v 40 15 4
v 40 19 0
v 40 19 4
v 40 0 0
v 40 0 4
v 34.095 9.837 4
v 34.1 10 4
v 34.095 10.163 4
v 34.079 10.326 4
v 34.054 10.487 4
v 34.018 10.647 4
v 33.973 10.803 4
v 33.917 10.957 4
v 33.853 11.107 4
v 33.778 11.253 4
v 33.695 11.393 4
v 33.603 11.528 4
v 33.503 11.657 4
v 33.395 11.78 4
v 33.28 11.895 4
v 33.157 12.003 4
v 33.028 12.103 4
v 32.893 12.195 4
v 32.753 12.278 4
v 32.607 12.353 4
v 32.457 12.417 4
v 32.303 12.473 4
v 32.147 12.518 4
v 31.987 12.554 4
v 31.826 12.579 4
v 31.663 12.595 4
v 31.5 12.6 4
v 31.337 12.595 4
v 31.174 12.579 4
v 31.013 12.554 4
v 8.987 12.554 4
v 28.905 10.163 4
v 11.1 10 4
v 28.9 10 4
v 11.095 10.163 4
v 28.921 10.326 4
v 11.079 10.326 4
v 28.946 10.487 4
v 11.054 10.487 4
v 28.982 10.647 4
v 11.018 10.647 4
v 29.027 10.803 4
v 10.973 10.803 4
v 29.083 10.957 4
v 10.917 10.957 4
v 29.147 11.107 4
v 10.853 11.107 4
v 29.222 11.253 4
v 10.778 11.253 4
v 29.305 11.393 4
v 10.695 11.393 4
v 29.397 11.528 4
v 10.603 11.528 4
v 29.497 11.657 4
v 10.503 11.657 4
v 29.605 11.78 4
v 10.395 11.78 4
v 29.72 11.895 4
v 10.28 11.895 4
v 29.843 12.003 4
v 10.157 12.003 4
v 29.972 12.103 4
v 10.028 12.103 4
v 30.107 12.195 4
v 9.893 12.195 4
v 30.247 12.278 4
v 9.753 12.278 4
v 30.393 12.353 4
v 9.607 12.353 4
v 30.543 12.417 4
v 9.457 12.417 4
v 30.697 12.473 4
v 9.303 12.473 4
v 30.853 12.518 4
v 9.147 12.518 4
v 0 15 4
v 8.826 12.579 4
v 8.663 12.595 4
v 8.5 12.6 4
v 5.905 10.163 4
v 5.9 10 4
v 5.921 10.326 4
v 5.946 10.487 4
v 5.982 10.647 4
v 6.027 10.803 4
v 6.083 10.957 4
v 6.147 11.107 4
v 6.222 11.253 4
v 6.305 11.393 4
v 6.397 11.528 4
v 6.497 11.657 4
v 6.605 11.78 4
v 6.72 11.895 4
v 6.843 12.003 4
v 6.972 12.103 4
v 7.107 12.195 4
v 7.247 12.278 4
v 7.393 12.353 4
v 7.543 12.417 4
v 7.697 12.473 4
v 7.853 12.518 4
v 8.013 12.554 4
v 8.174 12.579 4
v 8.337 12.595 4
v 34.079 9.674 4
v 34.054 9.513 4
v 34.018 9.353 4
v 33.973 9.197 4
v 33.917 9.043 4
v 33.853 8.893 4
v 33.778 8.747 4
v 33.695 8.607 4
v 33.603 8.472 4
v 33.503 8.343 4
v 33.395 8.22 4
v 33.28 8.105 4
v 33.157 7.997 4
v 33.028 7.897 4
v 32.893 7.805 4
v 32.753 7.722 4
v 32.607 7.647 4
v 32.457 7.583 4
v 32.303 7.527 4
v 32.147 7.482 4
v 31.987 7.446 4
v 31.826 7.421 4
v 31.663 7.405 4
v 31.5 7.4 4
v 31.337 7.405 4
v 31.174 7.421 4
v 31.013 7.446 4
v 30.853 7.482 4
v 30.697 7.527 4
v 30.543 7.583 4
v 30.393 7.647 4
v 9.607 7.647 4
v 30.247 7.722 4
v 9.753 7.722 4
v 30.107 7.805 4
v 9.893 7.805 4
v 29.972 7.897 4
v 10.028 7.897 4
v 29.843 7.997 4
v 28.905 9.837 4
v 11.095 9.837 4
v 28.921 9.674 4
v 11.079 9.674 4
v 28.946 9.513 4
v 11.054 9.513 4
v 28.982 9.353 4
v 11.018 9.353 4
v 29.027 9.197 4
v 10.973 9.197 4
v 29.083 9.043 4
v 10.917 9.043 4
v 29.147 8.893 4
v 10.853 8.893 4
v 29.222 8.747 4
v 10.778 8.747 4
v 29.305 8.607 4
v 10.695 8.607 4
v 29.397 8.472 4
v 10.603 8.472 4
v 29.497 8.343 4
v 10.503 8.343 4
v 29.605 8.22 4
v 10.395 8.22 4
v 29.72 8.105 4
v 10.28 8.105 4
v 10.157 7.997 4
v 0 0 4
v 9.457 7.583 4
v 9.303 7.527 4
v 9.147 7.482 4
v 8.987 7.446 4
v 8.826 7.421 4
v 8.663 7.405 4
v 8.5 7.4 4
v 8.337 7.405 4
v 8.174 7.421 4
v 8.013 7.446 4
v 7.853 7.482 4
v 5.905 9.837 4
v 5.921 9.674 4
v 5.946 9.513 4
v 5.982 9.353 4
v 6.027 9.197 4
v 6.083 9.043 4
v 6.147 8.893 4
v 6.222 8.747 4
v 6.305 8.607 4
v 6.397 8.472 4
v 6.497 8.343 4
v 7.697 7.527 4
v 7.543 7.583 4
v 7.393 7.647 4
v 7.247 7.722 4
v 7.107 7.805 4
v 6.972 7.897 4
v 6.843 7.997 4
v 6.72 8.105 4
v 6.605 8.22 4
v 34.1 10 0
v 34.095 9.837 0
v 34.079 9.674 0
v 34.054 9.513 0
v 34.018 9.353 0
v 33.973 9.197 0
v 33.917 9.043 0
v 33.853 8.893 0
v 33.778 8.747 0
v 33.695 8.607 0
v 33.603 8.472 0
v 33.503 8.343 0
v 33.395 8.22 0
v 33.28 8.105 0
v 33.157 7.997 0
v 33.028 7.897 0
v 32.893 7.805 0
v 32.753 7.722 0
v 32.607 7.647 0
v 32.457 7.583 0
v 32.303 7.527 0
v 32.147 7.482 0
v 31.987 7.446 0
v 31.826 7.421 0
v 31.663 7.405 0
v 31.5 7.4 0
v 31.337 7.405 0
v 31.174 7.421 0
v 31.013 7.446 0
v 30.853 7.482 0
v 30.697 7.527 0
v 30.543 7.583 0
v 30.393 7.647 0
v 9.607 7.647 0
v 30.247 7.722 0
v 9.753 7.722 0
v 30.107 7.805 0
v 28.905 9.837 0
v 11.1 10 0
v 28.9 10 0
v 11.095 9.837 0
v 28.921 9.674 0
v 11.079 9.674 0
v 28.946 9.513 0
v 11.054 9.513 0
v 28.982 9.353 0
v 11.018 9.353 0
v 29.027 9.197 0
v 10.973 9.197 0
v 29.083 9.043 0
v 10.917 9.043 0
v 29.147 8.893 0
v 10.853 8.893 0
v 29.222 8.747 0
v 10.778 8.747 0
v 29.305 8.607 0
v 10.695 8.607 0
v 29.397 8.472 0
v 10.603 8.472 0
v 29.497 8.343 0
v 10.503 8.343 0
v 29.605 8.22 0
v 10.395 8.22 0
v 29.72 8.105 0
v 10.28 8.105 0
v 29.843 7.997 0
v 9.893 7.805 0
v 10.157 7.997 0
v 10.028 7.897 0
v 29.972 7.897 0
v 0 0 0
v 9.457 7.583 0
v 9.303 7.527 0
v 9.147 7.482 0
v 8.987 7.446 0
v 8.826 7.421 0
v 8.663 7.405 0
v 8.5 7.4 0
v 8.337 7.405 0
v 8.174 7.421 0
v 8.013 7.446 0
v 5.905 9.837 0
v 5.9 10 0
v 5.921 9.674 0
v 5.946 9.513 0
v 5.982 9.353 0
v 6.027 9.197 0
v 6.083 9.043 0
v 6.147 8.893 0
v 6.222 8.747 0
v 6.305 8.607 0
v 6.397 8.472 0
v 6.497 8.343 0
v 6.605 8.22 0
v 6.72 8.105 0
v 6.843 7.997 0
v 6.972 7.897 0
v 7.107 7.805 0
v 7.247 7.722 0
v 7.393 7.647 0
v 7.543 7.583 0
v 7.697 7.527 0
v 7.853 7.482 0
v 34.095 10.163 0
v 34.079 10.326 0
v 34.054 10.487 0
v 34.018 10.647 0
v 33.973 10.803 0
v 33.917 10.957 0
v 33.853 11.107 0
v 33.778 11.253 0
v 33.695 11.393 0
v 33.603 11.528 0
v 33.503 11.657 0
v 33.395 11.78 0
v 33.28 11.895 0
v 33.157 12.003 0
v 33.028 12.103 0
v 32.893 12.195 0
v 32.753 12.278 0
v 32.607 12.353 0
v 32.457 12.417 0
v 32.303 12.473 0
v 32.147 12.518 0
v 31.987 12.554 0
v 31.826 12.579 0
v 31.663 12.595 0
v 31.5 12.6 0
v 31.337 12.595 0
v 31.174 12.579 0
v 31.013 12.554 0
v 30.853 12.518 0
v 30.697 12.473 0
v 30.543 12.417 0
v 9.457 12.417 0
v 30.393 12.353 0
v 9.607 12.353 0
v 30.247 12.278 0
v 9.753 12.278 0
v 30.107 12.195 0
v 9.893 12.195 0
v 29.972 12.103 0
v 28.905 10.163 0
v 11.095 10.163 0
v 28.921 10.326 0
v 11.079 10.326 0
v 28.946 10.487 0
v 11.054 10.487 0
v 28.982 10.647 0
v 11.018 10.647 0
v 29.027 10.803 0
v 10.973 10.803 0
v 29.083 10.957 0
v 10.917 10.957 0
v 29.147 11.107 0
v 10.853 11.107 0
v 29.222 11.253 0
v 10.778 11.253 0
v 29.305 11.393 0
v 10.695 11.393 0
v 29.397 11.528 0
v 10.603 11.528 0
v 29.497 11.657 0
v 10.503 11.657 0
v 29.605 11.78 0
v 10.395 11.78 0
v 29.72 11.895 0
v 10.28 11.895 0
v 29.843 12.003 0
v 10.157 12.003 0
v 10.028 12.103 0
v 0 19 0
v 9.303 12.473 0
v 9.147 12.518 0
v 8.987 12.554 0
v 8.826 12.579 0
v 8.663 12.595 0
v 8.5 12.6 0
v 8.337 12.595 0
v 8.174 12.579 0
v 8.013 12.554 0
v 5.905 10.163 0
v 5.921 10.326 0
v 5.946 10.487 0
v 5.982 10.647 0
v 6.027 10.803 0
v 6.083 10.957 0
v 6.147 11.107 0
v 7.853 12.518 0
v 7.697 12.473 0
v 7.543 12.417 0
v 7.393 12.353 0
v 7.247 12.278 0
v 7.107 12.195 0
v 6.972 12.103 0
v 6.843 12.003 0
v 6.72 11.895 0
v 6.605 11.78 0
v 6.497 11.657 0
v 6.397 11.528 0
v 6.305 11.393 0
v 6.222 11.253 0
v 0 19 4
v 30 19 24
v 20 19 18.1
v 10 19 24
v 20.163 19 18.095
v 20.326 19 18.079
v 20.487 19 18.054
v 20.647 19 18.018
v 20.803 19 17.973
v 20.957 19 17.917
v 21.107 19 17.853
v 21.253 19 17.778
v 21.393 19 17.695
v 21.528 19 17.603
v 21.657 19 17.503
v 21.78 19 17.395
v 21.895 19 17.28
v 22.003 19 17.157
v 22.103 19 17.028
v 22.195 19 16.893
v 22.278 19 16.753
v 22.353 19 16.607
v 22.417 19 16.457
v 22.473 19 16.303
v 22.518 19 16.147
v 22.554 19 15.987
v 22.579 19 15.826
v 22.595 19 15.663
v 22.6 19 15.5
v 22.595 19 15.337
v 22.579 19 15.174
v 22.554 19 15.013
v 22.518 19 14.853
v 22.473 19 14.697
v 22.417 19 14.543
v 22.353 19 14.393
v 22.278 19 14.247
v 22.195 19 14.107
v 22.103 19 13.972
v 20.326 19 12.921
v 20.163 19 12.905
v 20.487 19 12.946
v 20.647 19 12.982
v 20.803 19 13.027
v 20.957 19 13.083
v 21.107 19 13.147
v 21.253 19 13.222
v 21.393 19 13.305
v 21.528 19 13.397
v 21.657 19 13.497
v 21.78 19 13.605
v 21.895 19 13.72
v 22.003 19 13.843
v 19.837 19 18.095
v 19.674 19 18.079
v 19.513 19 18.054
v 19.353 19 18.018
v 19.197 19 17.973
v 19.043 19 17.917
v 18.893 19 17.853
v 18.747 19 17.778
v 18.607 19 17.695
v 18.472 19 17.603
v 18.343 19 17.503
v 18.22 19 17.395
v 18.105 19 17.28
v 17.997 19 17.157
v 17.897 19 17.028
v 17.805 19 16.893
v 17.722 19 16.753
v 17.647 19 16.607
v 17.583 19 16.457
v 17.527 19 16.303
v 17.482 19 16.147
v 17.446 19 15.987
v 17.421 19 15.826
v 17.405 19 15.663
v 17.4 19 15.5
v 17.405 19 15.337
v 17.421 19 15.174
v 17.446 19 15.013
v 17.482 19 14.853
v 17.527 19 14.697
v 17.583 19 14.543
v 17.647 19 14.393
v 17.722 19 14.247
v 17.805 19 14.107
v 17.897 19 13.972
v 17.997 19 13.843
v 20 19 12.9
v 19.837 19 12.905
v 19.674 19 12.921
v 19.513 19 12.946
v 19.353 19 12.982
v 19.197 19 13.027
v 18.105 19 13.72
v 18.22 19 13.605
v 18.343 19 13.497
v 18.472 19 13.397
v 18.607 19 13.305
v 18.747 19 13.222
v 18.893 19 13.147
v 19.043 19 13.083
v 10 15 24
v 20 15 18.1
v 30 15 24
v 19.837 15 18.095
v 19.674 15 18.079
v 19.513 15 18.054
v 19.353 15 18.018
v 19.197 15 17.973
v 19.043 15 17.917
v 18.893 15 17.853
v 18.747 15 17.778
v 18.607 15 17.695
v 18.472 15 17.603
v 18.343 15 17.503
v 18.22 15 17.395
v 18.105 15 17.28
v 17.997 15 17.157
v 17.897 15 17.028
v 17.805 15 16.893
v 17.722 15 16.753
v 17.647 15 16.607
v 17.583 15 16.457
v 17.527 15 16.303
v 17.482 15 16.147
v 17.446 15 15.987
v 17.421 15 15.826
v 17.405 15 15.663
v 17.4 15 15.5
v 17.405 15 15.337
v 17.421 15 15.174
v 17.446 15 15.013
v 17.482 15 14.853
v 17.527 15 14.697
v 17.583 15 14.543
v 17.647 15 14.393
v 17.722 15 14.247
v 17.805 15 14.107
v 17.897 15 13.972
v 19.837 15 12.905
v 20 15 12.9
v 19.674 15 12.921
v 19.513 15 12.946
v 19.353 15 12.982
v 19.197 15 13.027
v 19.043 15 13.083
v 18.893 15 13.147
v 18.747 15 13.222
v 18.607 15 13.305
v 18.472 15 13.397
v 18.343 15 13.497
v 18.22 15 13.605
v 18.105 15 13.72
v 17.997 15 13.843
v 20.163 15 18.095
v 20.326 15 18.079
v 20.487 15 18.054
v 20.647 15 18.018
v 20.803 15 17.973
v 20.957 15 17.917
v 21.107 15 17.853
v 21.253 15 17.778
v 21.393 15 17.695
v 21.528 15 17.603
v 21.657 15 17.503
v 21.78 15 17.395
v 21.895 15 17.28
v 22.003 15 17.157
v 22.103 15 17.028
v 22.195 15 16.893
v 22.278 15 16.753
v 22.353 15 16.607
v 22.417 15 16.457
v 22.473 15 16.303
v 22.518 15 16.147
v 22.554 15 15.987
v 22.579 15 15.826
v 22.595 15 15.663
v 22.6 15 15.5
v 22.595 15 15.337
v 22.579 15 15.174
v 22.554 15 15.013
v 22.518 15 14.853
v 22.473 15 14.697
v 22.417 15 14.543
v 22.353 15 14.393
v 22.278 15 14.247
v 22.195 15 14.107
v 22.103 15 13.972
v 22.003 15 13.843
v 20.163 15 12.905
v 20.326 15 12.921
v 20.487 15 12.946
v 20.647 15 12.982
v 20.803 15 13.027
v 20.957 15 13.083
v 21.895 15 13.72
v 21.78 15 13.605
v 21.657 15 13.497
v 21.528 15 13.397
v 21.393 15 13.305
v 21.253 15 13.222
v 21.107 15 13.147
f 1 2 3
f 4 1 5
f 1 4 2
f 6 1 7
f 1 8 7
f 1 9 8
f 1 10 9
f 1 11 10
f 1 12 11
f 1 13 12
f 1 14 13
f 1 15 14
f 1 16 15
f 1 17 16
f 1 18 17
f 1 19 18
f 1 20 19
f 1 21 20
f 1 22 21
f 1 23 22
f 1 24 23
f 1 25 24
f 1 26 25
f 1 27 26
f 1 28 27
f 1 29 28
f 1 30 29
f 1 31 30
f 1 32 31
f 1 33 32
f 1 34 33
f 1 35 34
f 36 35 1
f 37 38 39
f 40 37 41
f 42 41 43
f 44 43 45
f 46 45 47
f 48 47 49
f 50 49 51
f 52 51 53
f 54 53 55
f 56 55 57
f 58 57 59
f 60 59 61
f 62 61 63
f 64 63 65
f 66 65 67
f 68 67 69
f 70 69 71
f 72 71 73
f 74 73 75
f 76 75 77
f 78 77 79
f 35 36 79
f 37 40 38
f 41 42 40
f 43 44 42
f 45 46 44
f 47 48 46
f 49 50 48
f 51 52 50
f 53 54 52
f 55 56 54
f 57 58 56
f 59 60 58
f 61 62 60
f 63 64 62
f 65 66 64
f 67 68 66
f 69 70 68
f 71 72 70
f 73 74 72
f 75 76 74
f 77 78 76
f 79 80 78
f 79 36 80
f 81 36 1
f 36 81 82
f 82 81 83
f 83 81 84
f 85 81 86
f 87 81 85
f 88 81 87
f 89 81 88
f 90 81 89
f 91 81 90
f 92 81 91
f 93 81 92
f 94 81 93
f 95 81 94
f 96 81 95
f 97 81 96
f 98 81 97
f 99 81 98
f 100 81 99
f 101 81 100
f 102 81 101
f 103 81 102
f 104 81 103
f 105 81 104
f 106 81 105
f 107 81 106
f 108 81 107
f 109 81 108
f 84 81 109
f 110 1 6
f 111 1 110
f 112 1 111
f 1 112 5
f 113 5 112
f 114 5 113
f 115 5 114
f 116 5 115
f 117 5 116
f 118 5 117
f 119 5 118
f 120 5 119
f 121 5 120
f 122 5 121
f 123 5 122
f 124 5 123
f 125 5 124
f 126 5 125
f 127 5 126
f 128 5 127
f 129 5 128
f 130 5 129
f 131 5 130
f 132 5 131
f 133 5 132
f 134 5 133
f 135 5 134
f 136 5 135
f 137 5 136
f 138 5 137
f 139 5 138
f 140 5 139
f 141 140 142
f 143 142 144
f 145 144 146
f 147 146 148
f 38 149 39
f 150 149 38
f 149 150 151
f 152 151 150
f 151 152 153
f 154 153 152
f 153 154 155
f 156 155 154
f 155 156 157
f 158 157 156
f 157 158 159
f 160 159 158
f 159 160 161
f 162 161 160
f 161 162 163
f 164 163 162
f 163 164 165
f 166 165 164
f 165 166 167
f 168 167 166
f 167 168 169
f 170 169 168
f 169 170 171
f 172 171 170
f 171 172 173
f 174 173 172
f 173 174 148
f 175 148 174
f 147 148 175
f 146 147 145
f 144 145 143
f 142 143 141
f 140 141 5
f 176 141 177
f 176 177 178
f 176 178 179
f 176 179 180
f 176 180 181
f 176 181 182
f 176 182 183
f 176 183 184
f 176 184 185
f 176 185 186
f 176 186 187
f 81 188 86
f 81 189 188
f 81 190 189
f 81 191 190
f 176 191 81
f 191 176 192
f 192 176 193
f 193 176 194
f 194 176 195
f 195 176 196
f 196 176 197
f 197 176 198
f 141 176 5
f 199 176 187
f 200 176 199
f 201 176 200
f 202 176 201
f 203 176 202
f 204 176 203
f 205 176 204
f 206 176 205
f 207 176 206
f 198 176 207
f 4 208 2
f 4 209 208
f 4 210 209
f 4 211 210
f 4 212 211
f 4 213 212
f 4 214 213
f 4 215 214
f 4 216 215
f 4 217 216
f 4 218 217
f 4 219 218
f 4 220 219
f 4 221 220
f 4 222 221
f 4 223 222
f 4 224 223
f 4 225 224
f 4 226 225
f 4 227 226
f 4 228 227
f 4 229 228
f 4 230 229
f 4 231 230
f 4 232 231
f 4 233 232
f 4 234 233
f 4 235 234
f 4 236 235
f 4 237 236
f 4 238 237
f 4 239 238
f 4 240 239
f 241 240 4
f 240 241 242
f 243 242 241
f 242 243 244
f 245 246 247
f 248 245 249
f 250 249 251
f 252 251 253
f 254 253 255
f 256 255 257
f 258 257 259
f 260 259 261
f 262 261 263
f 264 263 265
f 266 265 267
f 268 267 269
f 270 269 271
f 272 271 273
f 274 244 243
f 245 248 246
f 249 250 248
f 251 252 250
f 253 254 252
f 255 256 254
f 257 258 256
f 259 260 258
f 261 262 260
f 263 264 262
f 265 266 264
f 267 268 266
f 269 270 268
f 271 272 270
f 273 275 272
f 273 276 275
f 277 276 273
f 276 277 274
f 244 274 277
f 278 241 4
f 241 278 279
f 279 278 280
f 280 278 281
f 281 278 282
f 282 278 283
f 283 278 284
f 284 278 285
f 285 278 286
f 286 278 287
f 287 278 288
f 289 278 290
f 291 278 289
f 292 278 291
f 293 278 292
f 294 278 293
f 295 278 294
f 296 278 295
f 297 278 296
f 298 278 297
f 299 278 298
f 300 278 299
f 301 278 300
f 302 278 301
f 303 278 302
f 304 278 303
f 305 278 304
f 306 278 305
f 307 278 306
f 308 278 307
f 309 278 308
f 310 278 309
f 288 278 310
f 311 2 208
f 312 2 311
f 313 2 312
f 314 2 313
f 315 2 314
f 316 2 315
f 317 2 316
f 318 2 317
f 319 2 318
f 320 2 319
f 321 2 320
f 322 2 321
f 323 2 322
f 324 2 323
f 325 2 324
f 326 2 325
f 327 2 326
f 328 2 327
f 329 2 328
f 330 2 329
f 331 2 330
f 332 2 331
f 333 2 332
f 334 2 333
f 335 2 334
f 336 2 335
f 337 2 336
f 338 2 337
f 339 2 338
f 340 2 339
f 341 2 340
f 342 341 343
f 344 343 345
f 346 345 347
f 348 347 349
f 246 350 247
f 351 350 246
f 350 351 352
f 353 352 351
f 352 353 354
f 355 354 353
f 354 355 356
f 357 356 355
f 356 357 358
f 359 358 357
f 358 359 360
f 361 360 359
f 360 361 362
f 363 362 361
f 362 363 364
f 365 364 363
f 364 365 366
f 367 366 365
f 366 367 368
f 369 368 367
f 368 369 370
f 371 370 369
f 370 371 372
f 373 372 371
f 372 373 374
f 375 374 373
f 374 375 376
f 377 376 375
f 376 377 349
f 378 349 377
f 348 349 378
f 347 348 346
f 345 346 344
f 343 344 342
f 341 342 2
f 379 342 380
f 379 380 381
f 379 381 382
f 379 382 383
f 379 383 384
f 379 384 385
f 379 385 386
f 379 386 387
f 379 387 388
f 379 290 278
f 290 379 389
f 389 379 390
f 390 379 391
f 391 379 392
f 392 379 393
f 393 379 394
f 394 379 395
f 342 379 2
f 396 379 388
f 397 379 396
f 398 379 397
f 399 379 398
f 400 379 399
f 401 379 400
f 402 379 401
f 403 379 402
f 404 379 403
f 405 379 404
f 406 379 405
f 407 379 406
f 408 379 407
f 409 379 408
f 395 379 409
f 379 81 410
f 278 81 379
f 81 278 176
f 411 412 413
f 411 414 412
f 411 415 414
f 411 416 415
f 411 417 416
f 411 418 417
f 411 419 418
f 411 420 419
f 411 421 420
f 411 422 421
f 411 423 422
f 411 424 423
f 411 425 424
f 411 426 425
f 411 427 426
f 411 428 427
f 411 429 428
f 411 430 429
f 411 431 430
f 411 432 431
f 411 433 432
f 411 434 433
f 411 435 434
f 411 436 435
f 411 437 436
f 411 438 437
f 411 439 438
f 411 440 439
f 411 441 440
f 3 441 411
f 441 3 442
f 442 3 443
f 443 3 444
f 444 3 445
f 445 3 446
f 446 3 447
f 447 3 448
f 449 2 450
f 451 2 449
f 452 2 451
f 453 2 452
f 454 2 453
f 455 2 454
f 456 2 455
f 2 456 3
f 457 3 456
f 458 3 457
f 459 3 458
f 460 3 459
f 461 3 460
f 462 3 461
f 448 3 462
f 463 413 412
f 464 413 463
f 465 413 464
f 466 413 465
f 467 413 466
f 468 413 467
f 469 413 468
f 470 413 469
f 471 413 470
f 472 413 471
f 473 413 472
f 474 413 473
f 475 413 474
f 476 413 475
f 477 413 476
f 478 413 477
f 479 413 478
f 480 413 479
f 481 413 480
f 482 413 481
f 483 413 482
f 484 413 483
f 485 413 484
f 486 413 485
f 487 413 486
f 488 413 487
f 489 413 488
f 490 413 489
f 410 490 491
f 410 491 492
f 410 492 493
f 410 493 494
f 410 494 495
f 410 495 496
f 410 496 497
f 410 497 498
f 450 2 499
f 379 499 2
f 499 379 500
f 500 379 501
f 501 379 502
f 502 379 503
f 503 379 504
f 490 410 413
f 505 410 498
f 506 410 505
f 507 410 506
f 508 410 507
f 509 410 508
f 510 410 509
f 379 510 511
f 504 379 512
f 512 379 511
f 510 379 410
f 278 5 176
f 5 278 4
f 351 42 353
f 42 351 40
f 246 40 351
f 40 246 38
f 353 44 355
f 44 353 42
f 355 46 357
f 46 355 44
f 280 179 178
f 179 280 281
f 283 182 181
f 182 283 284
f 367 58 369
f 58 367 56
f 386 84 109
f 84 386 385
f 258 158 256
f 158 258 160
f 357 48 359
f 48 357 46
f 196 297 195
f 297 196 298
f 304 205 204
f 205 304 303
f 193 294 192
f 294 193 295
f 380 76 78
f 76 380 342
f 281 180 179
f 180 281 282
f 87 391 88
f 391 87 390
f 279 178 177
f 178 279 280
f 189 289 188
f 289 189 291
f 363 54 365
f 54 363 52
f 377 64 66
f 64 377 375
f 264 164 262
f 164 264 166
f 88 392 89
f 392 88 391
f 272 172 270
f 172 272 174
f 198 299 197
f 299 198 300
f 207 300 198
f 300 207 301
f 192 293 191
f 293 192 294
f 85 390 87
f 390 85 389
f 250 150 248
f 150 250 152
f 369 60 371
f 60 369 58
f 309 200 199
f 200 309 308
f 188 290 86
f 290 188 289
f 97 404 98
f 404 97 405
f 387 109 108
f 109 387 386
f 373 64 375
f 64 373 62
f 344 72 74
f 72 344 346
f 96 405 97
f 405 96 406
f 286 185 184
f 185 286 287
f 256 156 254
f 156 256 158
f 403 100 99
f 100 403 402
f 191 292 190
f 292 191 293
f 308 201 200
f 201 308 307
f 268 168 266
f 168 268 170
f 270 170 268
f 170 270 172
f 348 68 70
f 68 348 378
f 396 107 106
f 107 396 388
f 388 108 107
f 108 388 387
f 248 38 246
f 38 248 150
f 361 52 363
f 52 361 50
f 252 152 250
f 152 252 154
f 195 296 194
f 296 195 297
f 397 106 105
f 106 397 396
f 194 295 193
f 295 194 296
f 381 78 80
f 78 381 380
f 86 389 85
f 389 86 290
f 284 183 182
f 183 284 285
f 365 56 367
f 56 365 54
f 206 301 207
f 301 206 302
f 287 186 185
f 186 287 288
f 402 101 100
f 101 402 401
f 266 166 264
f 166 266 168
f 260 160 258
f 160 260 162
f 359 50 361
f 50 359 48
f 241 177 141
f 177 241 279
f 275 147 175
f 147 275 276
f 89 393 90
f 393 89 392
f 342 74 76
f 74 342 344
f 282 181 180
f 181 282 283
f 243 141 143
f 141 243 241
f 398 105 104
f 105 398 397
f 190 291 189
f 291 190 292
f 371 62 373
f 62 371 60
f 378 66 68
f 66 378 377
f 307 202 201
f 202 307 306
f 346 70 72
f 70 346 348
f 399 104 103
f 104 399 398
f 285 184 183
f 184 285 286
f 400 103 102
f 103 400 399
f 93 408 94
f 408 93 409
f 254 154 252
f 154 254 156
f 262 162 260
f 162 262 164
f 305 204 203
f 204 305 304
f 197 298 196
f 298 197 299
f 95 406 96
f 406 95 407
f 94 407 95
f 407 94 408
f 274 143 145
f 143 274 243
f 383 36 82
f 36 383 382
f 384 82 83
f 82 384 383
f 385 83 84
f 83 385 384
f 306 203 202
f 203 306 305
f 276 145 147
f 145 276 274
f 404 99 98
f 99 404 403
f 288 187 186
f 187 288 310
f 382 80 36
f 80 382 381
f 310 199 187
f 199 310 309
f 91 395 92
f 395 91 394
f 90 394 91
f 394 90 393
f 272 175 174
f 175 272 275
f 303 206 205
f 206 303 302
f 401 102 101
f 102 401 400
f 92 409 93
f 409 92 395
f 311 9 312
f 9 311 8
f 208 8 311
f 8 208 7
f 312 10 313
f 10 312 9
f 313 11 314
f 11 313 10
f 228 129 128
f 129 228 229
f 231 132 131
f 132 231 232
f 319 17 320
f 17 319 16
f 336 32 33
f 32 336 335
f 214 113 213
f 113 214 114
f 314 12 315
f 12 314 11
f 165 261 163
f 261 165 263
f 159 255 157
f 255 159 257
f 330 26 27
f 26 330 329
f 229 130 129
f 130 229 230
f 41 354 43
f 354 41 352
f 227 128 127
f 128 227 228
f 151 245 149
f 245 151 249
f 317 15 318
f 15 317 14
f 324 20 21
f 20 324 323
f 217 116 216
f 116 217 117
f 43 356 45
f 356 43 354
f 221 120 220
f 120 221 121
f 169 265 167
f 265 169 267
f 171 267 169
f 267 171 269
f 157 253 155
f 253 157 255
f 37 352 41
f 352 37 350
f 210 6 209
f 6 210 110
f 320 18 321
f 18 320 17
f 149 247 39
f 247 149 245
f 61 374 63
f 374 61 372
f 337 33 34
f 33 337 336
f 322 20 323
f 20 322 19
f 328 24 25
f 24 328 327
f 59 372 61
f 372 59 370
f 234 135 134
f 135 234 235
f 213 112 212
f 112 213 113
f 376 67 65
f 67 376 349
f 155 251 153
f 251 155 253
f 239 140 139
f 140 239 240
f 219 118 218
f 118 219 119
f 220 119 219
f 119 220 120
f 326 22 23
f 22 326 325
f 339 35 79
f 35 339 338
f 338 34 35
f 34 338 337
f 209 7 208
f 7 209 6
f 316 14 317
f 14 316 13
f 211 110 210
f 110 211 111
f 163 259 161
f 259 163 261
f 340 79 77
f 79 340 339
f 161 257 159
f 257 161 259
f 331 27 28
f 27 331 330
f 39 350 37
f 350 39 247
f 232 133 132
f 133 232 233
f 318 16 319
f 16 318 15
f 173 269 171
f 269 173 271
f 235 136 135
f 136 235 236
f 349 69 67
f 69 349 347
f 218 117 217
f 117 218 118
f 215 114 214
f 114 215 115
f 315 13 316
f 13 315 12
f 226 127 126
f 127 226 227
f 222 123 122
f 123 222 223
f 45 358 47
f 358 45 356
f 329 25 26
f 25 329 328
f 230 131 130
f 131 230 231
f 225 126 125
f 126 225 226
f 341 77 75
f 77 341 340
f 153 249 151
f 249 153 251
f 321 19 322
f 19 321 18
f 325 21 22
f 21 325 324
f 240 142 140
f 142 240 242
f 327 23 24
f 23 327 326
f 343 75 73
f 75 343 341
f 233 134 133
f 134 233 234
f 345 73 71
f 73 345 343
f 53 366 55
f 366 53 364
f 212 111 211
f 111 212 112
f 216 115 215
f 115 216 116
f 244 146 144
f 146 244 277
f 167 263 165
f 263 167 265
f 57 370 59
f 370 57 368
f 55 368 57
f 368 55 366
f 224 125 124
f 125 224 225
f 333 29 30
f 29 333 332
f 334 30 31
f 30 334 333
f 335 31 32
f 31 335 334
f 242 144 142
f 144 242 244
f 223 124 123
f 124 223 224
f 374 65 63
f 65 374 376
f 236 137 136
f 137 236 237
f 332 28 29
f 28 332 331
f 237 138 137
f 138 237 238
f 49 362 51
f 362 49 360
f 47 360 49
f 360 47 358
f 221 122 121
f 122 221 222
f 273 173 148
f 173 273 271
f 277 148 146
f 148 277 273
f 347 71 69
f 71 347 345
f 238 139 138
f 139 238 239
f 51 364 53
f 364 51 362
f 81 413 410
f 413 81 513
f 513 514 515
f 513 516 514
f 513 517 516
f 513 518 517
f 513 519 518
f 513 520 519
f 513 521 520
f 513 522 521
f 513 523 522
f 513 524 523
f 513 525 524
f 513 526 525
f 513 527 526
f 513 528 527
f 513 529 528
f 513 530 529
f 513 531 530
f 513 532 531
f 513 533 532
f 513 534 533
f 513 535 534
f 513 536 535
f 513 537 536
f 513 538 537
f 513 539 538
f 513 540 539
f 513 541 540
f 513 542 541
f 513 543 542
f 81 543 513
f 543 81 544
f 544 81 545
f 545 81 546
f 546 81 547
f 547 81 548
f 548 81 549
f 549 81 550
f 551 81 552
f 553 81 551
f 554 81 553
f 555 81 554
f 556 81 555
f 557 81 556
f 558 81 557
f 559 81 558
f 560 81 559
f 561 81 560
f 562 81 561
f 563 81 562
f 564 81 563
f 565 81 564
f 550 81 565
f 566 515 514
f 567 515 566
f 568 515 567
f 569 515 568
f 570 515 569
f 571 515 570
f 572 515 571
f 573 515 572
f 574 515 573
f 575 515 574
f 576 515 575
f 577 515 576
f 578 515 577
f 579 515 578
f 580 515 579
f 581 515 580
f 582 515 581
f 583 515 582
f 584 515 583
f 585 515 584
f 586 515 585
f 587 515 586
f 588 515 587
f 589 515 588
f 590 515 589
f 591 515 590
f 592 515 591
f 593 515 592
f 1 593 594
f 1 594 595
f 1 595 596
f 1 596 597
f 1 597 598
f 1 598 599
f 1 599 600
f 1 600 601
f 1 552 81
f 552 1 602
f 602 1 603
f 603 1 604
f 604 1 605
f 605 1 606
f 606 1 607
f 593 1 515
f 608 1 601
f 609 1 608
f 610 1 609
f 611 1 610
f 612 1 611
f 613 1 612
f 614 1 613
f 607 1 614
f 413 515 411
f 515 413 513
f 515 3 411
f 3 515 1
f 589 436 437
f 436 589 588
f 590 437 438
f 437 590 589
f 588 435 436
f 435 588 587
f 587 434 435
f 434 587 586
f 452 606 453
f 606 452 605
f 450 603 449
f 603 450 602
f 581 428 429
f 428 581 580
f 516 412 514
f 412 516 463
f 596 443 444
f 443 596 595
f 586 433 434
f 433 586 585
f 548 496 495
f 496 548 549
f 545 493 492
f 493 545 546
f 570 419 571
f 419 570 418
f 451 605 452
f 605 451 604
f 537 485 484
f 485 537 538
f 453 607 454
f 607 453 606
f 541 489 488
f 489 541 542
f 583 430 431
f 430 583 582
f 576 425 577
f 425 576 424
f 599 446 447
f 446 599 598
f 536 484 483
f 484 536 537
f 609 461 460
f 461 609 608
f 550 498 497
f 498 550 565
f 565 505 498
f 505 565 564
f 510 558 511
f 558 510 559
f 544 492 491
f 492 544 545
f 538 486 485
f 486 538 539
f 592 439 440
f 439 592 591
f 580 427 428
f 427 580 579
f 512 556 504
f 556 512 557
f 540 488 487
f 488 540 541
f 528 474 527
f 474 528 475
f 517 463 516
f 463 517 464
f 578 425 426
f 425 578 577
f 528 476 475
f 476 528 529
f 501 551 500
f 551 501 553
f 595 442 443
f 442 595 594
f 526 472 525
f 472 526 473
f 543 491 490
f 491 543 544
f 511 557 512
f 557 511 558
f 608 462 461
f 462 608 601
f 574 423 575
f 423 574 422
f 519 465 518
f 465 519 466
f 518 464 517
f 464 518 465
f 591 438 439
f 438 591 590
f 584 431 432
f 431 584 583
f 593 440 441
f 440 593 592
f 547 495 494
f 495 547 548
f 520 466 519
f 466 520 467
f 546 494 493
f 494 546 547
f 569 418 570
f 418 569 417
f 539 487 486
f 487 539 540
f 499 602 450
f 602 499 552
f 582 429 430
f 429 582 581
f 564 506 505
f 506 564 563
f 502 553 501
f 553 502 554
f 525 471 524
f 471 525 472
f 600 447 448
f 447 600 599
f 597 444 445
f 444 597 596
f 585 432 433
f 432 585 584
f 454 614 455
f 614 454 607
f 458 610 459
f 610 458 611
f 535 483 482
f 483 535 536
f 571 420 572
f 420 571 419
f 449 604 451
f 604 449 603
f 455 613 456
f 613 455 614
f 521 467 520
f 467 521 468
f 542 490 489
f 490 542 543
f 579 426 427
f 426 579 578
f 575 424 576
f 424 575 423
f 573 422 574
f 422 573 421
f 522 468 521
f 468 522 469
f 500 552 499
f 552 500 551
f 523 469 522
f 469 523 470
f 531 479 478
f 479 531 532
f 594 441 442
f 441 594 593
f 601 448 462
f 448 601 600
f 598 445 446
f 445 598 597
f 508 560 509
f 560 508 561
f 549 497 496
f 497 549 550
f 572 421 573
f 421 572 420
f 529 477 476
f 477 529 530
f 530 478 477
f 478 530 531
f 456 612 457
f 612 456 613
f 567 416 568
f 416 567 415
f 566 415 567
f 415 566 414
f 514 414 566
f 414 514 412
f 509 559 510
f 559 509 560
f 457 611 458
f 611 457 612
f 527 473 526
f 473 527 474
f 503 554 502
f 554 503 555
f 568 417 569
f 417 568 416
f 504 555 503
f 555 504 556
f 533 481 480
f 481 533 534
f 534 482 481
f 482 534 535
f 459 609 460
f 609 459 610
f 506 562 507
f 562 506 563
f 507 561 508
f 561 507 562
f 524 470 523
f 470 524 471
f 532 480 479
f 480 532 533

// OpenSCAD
// file: functions.scad
/**********************************
	File: functions.scad
	Revision: 0.1 (10/7/2012)
	OpenSCAD version by:
	Michael Williams (gannon)
	mswillia@mtu.edu
**********************************/
include <config.scad>

//Drill a hole the given depth at the given location
module drill(x,y,radius,depth) {
	translate([x,y,-overdrill])
		cylinder(r=radius,h=depth,$fn=100);
}

module roundedcorner(radius,thickness,angle) {
	rotate([0,0,angle])
		translate([-radius+overdrill,-radius+overdrill,-overdrill])
			difference() {
				translate([-overdrill,-overdrill,0])
					cube([radius+overdrill,radius+overdrill,thickness+overdrill*2]);
				cylinder(r=radius,h=thickness+overdrill*2);
			}
}

//Usage: points is an array consisting of elements
//[x,y,r] for each point of the polygon
//Please note that x and y will be the centers
//of the rounded edges! Outside wall will be
//r away at some angle.
//Ideally I will make a function that will find
//the place to put the circle of a given radius
//based off of the points in the polygon.
module multiradiusroundedpoly(points,height) {
	linear_extrude(height=height)
		hull()
			for (p = points) {
				translate([p[0],p[1],0])
					circle(r=p[2],$fn=100);
			}
}
// file: config.scad
/**********************************
	File: config.scad
	Revision: 0.1 (10/7/2012)
	OpenSCAD version by:
	Michael Williams (gannon)
	mswillia@mtu.edu
**********************************/

/**********************************
		CONFIGURATION
**********************************/
//This is for the depth of holes so OpenSCAD renders correctly.
overdrill=0.1;

//Eventually group configurations into here. Maybe auto config for metric vs SAE components?

/**********************************
		END CONFIGURATION
**********************************/
// main file
/**********************************
	File: y_frameconnecter.scad
	Revision: 0.2 (10/7/2012)
	OpenSCAD version by:
	Michael Williams (gannon)
	mswillia@mtu.edu
**********************************/
include <config.scad>
use <functions.scad>
/**********************************
		CONFIGURATION
**********************************/
//Base size
width=40;
height=19;
thickness=4;

//Back size
t_width=20;
t_height=20;

//Holes
radius=2.6;

/**********************************
		END CONFIGURATION
**********************************/
union() {
	//Make our base unit
	difference() {
		cube([width,height,thickness]);

		//Drill the hole
		drill(8.5,10,radius,thickness+overdrill*2);
		drill(width-8.5,10,radius,thickness+overdrill*2);
	}

	//Back unit
	translate([0,height,thickness])
		rotate([90,0,0])
			difference() {
				linear_extrude(height=thickness)
					polygon(points=[[0,0],[((width-t_width)/2),t_height],[t_width+((width-t_width)/2),t_height],[width,0]]);
				drill(width/2,11.5,radius,thickness+overdrill*2);

			}
}
